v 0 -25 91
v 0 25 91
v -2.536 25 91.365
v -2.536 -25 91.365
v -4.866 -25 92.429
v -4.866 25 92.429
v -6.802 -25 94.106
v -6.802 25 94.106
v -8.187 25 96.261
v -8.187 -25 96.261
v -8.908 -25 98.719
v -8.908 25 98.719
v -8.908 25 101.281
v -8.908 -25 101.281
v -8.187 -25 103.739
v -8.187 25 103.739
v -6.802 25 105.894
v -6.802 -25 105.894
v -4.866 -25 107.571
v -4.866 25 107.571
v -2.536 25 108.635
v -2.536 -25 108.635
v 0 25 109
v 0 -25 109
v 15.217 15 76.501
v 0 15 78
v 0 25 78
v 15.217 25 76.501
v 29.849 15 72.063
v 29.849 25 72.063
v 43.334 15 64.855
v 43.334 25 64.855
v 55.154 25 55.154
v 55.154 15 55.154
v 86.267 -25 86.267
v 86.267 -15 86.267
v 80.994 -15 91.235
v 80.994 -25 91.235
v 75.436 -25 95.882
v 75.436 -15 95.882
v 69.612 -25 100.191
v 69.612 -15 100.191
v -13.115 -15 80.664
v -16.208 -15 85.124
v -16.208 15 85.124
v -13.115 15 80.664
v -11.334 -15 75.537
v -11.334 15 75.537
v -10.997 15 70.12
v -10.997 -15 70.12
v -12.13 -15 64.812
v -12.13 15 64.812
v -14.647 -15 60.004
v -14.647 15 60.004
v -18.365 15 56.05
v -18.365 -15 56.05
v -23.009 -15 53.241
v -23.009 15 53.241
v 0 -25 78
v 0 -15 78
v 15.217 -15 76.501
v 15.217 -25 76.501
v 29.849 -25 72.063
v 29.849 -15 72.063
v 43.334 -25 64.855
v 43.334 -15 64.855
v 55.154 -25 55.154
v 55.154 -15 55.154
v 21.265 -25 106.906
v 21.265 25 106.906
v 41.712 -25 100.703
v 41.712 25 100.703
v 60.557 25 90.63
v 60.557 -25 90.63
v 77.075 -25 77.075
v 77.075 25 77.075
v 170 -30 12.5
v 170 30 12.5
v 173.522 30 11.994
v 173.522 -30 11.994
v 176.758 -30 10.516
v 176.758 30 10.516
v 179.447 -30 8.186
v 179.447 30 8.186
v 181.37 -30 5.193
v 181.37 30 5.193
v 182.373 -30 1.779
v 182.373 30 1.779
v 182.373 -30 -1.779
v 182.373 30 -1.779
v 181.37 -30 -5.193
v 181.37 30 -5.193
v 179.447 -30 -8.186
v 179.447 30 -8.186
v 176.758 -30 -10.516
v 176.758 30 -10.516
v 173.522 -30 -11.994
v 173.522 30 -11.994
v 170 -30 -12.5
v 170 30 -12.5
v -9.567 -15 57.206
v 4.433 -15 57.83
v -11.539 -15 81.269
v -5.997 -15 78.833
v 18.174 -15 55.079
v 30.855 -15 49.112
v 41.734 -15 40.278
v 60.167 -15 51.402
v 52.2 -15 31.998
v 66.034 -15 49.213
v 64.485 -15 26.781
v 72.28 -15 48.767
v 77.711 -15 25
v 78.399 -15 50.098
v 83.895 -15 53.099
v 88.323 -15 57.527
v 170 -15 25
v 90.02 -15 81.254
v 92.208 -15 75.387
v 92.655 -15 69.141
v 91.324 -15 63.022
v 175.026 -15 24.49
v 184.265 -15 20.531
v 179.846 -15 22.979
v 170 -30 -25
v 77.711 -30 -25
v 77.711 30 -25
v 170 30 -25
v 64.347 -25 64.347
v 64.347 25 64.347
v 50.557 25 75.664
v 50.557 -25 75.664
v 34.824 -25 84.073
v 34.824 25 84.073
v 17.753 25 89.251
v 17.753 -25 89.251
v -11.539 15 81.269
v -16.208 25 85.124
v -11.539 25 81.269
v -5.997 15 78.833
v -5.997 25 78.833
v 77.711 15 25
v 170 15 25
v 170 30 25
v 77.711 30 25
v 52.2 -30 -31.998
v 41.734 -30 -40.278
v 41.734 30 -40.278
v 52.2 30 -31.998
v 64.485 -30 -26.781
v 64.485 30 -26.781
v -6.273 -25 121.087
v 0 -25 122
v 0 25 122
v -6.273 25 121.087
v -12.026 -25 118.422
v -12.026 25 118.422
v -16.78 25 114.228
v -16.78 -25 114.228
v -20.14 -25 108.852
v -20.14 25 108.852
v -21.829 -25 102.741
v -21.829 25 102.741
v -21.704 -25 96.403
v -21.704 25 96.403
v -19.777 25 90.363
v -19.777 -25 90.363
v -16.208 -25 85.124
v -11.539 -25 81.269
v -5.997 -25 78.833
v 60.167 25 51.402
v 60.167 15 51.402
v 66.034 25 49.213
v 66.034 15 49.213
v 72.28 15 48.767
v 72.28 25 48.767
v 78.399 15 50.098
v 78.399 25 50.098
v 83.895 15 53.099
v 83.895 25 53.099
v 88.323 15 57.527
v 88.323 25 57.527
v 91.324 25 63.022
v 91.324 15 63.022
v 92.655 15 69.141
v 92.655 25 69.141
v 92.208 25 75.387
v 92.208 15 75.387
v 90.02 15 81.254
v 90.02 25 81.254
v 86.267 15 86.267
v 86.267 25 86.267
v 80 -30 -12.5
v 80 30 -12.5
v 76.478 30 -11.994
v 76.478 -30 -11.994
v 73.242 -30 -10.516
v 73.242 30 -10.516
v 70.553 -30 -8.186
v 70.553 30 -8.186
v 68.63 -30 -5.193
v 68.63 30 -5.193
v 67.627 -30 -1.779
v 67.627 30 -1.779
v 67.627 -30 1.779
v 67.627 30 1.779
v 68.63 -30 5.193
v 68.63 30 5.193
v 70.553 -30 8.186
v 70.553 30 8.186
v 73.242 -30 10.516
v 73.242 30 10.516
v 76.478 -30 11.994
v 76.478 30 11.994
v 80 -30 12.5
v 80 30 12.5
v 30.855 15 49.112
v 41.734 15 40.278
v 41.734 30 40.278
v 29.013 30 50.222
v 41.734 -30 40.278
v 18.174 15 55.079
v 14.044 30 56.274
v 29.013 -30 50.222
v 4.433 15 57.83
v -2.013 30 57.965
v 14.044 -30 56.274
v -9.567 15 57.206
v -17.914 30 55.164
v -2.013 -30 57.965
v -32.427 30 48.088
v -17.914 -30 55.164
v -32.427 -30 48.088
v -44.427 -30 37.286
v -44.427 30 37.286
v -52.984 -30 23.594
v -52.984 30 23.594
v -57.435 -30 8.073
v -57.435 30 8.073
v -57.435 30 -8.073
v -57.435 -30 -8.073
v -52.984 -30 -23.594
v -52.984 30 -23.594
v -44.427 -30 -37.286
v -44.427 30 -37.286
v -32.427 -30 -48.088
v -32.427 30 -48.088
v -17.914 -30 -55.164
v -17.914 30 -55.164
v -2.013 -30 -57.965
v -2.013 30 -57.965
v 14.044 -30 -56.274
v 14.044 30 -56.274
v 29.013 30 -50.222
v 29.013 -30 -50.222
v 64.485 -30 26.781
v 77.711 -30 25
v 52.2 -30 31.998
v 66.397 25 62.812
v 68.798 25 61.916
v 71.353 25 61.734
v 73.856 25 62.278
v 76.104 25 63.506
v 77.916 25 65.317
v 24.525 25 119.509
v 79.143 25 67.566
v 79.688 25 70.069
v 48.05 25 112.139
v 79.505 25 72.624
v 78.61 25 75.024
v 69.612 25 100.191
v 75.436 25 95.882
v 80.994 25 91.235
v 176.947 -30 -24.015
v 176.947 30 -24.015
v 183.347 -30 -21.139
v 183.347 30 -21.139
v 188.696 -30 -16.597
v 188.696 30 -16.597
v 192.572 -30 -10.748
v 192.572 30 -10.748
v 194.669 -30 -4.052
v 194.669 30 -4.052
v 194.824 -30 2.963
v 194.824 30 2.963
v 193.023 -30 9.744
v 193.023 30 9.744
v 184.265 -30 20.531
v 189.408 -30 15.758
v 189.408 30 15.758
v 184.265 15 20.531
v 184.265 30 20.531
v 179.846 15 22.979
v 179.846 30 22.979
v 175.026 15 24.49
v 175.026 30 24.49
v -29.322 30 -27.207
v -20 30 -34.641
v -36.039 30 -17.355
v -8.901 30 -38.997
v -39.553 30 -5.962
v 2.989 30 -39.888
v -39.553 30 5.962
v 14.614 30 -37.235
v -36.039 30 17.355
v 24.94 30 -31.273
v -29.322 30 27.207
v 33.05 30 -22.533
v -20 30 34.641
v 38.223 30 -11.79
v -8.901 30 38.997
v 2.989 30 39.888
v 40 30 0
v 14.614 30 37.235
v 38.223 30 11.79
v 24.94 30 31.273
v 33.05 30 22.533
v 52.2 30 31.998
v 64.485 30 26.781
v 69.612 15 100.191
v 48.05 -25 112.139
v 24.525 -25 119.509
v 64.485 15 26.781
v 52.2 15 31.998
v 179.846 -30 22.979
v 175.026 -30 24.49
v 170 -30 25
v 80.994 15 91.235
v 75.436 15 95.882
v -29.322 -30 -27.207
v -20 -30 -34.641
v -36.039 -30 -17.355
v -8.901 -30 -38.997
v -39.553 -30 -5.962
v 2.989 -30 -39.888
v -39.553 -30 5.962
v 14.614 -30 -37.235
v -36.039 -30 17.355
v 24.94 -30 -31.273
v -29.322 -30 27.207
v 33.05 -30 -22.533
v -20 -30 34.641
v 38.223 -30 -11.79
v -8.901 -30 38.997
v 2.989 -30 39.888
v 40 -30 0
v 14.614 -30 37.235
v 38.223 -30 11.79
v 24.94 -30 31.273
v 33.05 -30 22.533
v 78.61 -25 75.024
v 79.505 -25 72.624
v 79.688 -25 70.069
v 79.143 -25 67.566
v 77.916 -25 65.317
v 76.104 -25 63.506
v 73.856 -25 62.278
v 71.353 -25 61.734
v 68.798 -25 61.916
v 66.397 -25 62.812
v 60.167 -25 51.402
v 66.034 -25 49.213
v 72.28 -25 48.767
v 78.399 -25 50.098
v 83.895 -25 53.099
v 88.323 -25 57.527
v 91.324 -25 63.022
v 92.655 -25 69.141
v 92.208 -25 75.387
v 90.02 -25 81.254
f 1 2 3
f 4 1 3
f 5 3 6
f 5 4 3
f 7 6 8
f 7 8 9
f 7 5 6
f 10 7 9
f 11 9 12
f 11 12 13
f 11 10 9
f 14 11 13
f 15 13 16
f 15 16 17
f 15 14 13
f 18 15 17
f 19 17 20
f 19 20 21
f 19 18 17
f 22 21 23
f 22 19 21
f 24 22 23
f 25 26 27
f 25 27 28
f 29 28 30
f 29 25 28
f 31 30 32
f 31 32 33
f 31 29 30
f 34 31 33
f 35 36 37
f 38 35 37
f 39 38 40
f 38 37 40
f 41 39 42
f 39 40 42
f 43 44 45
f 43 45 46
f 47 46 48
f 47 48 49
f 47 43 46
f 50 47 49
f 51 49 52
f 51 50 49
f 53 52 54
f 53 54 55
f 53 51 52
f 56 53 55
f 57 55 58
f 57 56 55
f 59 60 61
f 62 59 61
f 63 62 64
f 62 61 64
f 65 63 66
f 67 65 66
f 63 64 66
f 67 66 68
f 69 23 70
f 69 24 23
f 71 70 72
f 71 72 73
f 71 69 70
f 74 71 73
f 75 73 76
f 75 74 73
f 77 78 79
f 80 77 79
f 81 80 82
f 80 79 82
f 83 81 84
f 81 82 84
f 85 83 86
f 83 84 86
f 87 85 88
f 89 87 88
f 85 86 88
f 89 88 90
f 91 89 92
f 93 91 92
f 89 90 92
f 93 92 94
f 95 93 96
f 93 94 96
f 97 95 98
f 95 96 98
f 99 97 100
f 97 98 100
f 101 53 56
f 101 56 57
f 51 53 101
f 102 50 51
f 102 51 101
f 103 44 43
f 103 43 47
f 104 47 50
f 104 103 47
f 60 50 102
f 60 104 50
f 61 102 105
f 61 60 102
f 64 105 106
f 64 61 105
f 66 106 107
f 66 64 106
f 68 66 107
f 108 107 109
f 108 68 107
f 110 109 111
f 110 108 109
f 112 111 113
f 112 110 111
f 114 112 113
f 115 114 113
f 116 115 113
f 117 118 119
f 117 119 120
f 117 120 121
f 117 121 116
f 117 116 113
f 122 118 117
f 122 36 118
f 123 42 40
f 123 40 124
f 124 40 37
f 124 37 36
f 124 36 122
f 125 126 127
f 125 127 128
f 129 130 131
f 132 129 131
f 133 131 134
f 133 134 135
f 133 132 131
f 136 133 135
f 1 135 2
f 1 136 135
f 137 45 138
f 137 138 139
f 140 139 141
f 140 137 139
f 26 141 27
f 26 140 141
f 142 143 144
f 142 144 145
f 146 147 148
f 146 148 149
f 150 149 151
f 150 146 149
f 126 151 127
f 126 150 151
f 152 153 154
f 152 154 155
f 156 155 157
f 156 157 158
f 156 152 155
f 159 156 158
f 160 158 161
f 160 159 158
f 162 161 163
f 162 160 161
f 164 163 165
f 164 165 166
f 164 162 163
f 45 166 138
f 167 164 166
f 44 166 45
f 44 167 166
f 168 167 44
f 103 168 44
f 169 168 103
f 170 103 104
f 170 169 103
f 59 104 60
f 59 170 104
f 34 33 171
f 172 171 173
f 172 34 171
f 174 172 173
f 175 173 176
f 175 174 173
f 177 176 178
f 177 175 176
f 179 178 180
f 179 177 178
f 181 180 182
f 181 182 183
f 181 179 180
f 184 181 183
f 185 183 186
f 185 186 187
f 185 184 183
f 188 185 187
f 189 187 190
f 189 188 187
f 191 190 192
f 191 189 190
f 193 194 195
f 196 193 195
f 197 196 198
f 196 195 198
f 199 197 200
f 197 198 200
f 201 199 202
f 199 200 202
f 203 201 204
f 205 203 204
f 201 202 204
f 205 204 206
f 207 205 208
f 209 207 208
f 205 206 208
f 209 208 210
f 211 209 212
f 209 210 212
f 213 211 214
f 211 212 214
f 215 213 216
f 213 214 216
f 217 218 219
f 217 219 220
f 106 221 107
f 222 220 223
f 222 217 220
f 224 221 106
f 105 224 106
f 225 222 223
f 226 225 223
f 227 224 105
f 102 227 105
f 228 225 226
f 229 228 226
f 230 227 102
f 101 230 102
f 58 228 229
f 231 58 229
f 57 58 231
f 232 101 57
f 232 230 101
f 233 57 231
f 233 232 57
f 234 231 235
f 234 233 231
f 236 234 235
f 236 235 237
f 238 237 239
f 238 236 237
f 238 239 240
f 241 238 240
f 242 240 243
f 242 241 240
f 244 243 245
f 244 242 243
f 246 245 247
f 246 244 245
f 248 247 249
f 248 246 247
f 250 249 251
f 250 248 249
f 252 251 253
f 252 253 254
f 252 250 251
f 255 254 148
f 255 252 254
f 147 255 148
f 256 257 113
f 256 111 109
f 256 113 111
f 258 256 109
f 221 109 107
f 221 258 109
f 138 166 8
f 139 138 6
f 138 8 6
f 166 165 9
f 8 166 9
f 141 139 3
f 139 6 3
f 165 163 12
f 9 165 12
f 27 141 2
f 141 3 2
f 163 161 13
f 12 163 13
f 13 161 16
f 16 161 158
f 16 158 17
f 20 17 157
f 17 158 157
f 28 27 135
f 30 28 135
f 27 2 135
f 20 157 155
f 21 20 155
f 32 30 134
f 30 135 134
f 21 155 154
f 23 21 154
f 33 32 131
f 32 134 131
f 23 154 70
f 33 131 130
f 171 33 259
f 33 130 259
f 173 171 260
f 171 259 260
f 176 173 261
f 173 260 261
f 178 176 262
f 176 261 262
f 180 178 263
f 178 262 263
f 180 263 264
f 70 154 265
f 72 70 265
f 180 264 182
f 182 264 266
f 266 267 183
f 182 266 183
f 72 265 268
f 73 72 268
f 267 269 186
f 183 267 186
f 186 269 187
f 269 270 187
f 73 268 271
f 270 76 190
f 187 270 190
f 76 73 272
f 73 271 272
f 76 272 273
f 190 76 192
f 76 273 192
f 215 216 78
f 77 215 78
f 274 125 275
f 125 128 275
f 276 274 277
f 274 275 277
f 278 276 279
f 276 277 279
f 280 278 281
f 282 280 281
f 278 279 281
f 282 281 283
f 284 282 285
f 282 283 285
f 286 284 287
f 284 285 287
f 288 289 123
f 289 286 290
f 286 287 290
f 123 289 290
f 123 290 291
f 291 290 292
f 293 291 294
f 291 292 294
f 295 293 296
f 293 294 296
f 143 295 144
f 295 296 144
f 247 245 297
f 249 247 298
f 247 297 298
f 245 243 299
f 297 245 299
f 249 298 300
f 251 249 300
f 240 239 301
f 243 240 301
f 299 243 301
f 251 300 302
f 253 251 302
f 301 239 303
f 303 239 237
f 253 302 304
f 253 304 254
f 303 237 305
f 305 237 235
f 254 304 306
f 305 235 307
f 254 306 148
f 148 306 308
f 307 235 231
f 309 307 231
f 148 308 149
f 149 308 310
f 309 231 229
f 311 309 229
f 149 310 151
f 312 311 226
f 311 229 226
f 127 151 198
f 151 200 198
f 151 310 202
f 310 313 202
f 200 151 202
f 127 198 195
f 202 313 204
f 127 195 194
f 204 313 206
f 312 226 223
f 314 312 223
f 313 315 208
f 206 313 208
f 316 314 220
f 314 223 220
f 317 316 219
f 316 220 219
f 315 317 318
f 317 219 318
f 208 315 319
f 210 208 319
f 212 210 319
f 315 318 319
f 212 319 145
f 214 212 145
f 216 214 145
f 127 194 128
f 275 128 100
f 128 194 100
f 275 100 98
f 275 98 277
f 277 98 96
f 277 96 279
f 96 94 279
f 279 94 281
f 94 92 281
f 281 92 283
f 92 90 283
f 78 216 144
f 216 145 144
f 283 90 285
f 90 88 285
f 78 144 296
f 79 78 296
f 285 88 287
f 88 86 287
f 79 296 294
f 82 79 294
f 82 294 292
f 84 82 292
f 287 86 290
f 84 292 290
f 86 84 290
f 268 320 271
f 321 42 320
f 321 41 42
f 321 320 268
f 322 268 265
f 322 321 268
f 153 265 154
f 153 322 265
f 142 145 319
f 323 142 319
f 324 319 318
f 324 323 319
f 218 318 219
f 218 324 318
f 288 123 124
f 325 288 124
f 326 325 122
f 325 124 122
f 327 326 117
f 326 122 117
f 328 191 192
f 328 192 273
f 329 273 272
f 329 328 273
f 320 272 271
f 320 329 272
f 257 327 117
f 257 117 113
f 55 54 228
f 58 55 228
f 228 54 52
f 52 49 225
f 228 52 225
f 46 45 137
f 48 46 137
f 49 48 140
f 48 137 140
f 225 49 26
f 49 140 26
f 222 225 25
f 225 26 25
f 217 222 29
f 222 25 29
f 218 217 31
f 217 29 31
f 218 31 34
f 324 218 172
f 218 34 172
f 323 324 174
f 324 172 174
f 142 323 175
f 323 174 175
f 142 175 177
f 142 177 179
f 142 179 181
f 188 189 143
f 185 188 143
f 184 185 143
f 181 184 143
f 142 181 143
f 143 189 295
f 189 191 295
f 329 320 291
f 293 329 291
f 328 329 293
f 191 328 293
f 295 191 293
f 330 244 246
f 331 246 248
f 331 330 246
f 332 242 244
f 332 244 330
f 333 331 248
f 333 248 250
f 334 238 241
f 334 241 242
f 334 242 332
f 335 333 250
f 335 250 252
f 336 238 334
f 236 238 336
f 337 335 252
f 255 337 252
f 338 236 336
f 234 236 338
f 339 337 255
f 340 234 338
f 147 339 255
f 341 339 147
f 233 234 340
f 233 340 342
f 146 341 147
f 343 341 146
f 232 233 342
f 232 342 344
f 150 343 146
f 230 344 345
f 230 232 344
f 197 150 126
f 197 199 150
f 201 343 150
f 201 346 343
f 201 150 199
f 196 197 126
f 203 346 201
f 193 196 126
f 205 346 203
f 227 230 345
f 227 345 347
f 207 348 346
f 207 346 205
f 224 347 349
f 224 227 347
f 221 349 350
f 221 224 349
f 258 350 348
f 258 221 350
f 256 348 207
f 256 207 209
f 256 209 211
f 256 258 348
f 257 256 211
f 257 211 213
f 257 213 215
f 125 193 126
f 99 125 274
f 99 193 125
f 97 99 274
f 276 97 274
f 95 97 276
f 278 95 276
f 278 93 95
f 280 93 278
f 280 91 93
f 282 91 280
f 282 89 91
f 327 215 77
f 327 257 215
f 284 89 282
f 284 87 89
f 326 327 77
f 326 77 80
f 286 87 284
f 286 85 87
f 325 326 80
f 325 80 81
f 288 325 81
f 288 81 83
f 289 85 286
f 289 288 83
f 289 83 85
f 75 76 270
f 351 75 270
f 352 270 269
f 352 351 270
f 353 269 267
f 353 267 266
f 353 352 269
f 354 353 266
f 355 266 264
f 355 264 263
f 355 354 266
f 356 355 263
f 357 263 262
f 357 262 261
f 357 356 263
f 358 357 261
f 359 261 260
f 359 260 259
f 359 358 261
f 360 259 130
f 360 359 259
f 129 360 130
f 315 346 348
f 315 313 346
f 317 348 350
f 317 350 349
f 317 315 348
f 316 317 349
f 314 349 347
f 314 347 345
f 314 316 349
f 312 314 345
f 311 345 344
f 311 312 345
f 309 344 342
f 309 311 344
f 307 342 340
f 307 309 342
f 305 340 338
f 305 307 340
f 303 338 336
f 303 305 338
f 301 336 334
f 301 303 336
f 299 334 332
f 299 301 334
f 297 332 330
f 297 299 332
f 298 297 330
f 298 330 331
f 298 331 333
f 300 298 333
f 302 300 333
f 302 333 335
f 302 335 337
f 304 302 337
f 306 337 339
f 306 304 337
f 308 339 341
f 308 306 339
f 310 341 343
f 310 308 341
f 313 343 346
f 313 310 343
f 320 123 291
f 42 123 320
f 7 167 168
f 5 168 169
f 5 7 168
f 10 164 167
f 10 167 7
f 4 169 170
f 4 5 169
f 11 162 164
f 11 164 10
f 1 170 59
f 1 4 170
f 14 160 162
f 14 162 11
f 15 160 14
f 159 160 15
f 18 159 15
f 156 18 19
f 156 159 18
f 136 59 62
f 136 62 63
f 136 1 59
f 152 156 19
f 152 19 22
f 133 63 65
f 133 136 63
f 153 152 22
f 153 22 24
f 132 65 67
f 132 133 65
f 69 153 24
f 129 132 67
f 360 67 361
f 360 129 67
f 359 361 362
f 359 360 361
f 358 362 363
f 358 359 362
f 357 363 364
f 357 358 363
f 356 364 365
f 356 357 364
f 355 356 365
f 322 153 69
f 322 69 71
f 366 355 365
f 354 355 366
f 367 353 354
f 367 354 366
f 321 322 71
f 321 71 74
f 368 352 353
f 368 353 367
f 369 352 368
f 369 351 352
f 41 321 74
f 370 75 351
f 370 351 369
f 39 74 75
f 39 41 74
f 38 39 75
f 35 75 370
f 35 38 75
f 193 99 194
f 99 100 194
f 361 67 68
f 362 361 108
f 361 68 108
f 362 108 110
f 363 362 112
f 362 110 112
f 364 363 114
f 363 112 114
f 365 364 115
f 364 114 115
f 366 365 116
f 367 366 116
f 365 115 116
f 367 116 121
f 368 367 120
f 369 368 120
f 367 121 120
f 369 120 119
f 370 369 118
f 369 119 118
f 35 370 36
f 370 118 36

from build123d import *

# Parameters (mm, degrees)
F1_DEPTH = 15
F0_R     = 40
F2_DEPTH = 30
F3_DEPTH = 25
F4_DEPTH = 25


with BuildPart() as f1:
    # F0 (on Front) → F1 (new body, symmetric)
    with BuildSketch(Plane.XZ):
        with BuildLine():
            ThreePointArc((55.1543289326, 55.1543289326), (29.8493077245, 72.0626035359), (0, 78))
            ThreePointArc((0, 78), (-8.8522259778, 79.8595408384), (-16.2079905268, 85.1238095238))
            ThreePointArc((-16.2079905268, 85.1238095238), (-11.3825323132, 67.4278790278), (-23.0085459926, 53.241025641))
            ThreePointArc((-23.0085459926, 53.241025641), (11.3872373178, 56.8711774651), (41.7336868403, 40.2777777778))
            ThreePointArc((41.7336868403, 40.2777777778), (58.1676040827, 28.9776624284), (77.7110030819, 25))
            Line((77.7110030819, 25), (170, 25))
            ThreePointArc((170, 25), (177.4741993043, 23.8565786474), (184.2647058824, 20.5309075808))
            Line((184.2647058824, 20.5309075808), (69.6117647059, 100.1908289941))
            ThreePointArc((69.6117647059, 100.1908289941), (78.2497125429, 93.6001201225), (86.2670273048, 86.2670273048))
            ThreePointArc((86.2670273048, 86.2670273048), (86.2670273048, 55.1543289326), (55.1543289326, 55.1543289326))
        make_face()
    extrude(amount=F1_DEPTH, both=True)

    # F0 (on Front) → F2 (join, symmetric)
    with BuildSketch(Plane.XZ):
        with BuildLine():
            ThreePointArc((41.7336868403, 40.2777777778), (11.3872373178, 56.8711774651), (-23.0085459926, 53.241025641))
            ThreePointArc((-23.0085459926, 53.241025641), (-47.6875180017, -33.013643041), (41.7336868403, -40.2777777778))
            ThreePointArc((41.7336868403, -40.2777777778), (58.1676040827, -28.9776624284), (77.7110030819, -25))
            Line((77.7110030819, -25), (170, -25))
            ThreePointArc((170, -25), (193.8565786474, -7.4741993043), (184.2647058824, 20.5309075808))
            ThreePointArc((184.2647058824, 20.5309075808), (177.4741993043, 23.8565786474), (170, 25))
            Line((170, 25), (77.7110030819, 25))
            ThreePointArc((77.7110030819, 25), (58.1676040827, 28.9776624284), (41.7336868403, 40.2777777778))
        make_face()
        Circle(F0_R, mode=Mode.SUBTRACT)
        with BuildLine():
            Line((170, -12.5), (80, -12.5))
            ThreePointArc((80, -12.5), (67.5, 0), (80, 12.5))
            Line((80, 12.5), (170, 12.5))
            ThreePointArc((170, 12.5), (182.5, 0), (170, -12.5))
        make_face(mode=Mode.SUBTRACT)
    extrude(amount=F2_DEPTH, both=True)

    # F0 (on Front) → F3 (join, symmetric)
    with BuildSketch(Plane.XZ):
        with BuildLine():
            ThreePointArc((-16.2079905268, 85.1238095238), (-8.8522259778, 79.8595408384), (0, 78))
            ThreePointArc((0, 78), (29.8493077245, 72.0626035359), (55.1543289326, 55.1543289326))
            ThreePointArc((55.1543289326, 55.1543289326), (86.2670273048, 55.1543289326), (86.2670273048, 86.2670273048))
            ThreePointArc((86.2670273048, 86.2670273048), (78.2497125429, 93.6001201225), (69.6117647059, 100.1908289941))
            ThreePointArc((69.6117647059, 100.1908289941), (36.474092605, 116.4201037993), (0, 122))
            ThreePointArc((0, 122), (-20.1404591616, 108.8522259778), (-16.2079905268, 85.1238095238))
        make_face()
        with BuildLine():
            ThreePointArc((64.346717088, 64.346717088), (34.8241923452, 84.0730374585), (0, 91))
            ThreePointArc((0, 91), (-9, 100), (0, 109))
            ThreePointArc((0, 109), (41.7124941278, 100.7028690437), (77.0746391493, 77.0746391493))
            ThreePointArc((77.0746391493, 77.0746391493), (77.0746391493, 64.346717088), (64.346717088, 64.346717088))
        make_face(mode=Mode.SUBTRACT)
    extrude(amount=F3_DEPTH, both=True)

    # F0 (on Front) → F4 (join, symmetric)
    with BuildSketch(Plane.XZ):
        with BuildLine():
            ThreePointArc((-16.2079905268, 85.1238095238), (-8.8522259778, 79.8595408384), (0, 78))
            ThreePointArc((0, 78), (29.8493077245, 72.0626035359), (55.1543289326, 55.1543289326))
            ThreePointArc((55.1543289326, 55.1543289326), (86.2670273048, 55.1543289326), (86.2670273048, 86.2670273048))
            ThreePointArc((86.2670273048, 86.2670273048), (78.2497125429, 93.6001201225), (69.6117647059, 100.1908289941))
            ThreePointArc((69.6117647059, 100.1908289941), (36.474092605, 116.4201037993), (0, 122))
            ThreePointArc((0, 122), (-20.1404591616, 108.8522259778), (-16.2079905268, 85.1238095238))
        make_face()
        with BuildLine():
            ThreePointArc((64.346717088, 64.346717088), (34.8241923452, 84.0730374585), (0, 91))
            ThreePointArc((0, 91), (-9, 100), (0, 109))
            ThreePointArc((0, 109), (41.7124941278, 100.7028690437), (77.0746391493, 77.0746391493))
            ThreePointArc((77.0746391493, 77.0746391493), (77.0746391493, 64.346717088), (64.346717088, 64.346717088))
        make_face(mode=Mode.SUBTRACT)
    extrude(amount=F4_DEPTH, both=True)


solid = f1.part
